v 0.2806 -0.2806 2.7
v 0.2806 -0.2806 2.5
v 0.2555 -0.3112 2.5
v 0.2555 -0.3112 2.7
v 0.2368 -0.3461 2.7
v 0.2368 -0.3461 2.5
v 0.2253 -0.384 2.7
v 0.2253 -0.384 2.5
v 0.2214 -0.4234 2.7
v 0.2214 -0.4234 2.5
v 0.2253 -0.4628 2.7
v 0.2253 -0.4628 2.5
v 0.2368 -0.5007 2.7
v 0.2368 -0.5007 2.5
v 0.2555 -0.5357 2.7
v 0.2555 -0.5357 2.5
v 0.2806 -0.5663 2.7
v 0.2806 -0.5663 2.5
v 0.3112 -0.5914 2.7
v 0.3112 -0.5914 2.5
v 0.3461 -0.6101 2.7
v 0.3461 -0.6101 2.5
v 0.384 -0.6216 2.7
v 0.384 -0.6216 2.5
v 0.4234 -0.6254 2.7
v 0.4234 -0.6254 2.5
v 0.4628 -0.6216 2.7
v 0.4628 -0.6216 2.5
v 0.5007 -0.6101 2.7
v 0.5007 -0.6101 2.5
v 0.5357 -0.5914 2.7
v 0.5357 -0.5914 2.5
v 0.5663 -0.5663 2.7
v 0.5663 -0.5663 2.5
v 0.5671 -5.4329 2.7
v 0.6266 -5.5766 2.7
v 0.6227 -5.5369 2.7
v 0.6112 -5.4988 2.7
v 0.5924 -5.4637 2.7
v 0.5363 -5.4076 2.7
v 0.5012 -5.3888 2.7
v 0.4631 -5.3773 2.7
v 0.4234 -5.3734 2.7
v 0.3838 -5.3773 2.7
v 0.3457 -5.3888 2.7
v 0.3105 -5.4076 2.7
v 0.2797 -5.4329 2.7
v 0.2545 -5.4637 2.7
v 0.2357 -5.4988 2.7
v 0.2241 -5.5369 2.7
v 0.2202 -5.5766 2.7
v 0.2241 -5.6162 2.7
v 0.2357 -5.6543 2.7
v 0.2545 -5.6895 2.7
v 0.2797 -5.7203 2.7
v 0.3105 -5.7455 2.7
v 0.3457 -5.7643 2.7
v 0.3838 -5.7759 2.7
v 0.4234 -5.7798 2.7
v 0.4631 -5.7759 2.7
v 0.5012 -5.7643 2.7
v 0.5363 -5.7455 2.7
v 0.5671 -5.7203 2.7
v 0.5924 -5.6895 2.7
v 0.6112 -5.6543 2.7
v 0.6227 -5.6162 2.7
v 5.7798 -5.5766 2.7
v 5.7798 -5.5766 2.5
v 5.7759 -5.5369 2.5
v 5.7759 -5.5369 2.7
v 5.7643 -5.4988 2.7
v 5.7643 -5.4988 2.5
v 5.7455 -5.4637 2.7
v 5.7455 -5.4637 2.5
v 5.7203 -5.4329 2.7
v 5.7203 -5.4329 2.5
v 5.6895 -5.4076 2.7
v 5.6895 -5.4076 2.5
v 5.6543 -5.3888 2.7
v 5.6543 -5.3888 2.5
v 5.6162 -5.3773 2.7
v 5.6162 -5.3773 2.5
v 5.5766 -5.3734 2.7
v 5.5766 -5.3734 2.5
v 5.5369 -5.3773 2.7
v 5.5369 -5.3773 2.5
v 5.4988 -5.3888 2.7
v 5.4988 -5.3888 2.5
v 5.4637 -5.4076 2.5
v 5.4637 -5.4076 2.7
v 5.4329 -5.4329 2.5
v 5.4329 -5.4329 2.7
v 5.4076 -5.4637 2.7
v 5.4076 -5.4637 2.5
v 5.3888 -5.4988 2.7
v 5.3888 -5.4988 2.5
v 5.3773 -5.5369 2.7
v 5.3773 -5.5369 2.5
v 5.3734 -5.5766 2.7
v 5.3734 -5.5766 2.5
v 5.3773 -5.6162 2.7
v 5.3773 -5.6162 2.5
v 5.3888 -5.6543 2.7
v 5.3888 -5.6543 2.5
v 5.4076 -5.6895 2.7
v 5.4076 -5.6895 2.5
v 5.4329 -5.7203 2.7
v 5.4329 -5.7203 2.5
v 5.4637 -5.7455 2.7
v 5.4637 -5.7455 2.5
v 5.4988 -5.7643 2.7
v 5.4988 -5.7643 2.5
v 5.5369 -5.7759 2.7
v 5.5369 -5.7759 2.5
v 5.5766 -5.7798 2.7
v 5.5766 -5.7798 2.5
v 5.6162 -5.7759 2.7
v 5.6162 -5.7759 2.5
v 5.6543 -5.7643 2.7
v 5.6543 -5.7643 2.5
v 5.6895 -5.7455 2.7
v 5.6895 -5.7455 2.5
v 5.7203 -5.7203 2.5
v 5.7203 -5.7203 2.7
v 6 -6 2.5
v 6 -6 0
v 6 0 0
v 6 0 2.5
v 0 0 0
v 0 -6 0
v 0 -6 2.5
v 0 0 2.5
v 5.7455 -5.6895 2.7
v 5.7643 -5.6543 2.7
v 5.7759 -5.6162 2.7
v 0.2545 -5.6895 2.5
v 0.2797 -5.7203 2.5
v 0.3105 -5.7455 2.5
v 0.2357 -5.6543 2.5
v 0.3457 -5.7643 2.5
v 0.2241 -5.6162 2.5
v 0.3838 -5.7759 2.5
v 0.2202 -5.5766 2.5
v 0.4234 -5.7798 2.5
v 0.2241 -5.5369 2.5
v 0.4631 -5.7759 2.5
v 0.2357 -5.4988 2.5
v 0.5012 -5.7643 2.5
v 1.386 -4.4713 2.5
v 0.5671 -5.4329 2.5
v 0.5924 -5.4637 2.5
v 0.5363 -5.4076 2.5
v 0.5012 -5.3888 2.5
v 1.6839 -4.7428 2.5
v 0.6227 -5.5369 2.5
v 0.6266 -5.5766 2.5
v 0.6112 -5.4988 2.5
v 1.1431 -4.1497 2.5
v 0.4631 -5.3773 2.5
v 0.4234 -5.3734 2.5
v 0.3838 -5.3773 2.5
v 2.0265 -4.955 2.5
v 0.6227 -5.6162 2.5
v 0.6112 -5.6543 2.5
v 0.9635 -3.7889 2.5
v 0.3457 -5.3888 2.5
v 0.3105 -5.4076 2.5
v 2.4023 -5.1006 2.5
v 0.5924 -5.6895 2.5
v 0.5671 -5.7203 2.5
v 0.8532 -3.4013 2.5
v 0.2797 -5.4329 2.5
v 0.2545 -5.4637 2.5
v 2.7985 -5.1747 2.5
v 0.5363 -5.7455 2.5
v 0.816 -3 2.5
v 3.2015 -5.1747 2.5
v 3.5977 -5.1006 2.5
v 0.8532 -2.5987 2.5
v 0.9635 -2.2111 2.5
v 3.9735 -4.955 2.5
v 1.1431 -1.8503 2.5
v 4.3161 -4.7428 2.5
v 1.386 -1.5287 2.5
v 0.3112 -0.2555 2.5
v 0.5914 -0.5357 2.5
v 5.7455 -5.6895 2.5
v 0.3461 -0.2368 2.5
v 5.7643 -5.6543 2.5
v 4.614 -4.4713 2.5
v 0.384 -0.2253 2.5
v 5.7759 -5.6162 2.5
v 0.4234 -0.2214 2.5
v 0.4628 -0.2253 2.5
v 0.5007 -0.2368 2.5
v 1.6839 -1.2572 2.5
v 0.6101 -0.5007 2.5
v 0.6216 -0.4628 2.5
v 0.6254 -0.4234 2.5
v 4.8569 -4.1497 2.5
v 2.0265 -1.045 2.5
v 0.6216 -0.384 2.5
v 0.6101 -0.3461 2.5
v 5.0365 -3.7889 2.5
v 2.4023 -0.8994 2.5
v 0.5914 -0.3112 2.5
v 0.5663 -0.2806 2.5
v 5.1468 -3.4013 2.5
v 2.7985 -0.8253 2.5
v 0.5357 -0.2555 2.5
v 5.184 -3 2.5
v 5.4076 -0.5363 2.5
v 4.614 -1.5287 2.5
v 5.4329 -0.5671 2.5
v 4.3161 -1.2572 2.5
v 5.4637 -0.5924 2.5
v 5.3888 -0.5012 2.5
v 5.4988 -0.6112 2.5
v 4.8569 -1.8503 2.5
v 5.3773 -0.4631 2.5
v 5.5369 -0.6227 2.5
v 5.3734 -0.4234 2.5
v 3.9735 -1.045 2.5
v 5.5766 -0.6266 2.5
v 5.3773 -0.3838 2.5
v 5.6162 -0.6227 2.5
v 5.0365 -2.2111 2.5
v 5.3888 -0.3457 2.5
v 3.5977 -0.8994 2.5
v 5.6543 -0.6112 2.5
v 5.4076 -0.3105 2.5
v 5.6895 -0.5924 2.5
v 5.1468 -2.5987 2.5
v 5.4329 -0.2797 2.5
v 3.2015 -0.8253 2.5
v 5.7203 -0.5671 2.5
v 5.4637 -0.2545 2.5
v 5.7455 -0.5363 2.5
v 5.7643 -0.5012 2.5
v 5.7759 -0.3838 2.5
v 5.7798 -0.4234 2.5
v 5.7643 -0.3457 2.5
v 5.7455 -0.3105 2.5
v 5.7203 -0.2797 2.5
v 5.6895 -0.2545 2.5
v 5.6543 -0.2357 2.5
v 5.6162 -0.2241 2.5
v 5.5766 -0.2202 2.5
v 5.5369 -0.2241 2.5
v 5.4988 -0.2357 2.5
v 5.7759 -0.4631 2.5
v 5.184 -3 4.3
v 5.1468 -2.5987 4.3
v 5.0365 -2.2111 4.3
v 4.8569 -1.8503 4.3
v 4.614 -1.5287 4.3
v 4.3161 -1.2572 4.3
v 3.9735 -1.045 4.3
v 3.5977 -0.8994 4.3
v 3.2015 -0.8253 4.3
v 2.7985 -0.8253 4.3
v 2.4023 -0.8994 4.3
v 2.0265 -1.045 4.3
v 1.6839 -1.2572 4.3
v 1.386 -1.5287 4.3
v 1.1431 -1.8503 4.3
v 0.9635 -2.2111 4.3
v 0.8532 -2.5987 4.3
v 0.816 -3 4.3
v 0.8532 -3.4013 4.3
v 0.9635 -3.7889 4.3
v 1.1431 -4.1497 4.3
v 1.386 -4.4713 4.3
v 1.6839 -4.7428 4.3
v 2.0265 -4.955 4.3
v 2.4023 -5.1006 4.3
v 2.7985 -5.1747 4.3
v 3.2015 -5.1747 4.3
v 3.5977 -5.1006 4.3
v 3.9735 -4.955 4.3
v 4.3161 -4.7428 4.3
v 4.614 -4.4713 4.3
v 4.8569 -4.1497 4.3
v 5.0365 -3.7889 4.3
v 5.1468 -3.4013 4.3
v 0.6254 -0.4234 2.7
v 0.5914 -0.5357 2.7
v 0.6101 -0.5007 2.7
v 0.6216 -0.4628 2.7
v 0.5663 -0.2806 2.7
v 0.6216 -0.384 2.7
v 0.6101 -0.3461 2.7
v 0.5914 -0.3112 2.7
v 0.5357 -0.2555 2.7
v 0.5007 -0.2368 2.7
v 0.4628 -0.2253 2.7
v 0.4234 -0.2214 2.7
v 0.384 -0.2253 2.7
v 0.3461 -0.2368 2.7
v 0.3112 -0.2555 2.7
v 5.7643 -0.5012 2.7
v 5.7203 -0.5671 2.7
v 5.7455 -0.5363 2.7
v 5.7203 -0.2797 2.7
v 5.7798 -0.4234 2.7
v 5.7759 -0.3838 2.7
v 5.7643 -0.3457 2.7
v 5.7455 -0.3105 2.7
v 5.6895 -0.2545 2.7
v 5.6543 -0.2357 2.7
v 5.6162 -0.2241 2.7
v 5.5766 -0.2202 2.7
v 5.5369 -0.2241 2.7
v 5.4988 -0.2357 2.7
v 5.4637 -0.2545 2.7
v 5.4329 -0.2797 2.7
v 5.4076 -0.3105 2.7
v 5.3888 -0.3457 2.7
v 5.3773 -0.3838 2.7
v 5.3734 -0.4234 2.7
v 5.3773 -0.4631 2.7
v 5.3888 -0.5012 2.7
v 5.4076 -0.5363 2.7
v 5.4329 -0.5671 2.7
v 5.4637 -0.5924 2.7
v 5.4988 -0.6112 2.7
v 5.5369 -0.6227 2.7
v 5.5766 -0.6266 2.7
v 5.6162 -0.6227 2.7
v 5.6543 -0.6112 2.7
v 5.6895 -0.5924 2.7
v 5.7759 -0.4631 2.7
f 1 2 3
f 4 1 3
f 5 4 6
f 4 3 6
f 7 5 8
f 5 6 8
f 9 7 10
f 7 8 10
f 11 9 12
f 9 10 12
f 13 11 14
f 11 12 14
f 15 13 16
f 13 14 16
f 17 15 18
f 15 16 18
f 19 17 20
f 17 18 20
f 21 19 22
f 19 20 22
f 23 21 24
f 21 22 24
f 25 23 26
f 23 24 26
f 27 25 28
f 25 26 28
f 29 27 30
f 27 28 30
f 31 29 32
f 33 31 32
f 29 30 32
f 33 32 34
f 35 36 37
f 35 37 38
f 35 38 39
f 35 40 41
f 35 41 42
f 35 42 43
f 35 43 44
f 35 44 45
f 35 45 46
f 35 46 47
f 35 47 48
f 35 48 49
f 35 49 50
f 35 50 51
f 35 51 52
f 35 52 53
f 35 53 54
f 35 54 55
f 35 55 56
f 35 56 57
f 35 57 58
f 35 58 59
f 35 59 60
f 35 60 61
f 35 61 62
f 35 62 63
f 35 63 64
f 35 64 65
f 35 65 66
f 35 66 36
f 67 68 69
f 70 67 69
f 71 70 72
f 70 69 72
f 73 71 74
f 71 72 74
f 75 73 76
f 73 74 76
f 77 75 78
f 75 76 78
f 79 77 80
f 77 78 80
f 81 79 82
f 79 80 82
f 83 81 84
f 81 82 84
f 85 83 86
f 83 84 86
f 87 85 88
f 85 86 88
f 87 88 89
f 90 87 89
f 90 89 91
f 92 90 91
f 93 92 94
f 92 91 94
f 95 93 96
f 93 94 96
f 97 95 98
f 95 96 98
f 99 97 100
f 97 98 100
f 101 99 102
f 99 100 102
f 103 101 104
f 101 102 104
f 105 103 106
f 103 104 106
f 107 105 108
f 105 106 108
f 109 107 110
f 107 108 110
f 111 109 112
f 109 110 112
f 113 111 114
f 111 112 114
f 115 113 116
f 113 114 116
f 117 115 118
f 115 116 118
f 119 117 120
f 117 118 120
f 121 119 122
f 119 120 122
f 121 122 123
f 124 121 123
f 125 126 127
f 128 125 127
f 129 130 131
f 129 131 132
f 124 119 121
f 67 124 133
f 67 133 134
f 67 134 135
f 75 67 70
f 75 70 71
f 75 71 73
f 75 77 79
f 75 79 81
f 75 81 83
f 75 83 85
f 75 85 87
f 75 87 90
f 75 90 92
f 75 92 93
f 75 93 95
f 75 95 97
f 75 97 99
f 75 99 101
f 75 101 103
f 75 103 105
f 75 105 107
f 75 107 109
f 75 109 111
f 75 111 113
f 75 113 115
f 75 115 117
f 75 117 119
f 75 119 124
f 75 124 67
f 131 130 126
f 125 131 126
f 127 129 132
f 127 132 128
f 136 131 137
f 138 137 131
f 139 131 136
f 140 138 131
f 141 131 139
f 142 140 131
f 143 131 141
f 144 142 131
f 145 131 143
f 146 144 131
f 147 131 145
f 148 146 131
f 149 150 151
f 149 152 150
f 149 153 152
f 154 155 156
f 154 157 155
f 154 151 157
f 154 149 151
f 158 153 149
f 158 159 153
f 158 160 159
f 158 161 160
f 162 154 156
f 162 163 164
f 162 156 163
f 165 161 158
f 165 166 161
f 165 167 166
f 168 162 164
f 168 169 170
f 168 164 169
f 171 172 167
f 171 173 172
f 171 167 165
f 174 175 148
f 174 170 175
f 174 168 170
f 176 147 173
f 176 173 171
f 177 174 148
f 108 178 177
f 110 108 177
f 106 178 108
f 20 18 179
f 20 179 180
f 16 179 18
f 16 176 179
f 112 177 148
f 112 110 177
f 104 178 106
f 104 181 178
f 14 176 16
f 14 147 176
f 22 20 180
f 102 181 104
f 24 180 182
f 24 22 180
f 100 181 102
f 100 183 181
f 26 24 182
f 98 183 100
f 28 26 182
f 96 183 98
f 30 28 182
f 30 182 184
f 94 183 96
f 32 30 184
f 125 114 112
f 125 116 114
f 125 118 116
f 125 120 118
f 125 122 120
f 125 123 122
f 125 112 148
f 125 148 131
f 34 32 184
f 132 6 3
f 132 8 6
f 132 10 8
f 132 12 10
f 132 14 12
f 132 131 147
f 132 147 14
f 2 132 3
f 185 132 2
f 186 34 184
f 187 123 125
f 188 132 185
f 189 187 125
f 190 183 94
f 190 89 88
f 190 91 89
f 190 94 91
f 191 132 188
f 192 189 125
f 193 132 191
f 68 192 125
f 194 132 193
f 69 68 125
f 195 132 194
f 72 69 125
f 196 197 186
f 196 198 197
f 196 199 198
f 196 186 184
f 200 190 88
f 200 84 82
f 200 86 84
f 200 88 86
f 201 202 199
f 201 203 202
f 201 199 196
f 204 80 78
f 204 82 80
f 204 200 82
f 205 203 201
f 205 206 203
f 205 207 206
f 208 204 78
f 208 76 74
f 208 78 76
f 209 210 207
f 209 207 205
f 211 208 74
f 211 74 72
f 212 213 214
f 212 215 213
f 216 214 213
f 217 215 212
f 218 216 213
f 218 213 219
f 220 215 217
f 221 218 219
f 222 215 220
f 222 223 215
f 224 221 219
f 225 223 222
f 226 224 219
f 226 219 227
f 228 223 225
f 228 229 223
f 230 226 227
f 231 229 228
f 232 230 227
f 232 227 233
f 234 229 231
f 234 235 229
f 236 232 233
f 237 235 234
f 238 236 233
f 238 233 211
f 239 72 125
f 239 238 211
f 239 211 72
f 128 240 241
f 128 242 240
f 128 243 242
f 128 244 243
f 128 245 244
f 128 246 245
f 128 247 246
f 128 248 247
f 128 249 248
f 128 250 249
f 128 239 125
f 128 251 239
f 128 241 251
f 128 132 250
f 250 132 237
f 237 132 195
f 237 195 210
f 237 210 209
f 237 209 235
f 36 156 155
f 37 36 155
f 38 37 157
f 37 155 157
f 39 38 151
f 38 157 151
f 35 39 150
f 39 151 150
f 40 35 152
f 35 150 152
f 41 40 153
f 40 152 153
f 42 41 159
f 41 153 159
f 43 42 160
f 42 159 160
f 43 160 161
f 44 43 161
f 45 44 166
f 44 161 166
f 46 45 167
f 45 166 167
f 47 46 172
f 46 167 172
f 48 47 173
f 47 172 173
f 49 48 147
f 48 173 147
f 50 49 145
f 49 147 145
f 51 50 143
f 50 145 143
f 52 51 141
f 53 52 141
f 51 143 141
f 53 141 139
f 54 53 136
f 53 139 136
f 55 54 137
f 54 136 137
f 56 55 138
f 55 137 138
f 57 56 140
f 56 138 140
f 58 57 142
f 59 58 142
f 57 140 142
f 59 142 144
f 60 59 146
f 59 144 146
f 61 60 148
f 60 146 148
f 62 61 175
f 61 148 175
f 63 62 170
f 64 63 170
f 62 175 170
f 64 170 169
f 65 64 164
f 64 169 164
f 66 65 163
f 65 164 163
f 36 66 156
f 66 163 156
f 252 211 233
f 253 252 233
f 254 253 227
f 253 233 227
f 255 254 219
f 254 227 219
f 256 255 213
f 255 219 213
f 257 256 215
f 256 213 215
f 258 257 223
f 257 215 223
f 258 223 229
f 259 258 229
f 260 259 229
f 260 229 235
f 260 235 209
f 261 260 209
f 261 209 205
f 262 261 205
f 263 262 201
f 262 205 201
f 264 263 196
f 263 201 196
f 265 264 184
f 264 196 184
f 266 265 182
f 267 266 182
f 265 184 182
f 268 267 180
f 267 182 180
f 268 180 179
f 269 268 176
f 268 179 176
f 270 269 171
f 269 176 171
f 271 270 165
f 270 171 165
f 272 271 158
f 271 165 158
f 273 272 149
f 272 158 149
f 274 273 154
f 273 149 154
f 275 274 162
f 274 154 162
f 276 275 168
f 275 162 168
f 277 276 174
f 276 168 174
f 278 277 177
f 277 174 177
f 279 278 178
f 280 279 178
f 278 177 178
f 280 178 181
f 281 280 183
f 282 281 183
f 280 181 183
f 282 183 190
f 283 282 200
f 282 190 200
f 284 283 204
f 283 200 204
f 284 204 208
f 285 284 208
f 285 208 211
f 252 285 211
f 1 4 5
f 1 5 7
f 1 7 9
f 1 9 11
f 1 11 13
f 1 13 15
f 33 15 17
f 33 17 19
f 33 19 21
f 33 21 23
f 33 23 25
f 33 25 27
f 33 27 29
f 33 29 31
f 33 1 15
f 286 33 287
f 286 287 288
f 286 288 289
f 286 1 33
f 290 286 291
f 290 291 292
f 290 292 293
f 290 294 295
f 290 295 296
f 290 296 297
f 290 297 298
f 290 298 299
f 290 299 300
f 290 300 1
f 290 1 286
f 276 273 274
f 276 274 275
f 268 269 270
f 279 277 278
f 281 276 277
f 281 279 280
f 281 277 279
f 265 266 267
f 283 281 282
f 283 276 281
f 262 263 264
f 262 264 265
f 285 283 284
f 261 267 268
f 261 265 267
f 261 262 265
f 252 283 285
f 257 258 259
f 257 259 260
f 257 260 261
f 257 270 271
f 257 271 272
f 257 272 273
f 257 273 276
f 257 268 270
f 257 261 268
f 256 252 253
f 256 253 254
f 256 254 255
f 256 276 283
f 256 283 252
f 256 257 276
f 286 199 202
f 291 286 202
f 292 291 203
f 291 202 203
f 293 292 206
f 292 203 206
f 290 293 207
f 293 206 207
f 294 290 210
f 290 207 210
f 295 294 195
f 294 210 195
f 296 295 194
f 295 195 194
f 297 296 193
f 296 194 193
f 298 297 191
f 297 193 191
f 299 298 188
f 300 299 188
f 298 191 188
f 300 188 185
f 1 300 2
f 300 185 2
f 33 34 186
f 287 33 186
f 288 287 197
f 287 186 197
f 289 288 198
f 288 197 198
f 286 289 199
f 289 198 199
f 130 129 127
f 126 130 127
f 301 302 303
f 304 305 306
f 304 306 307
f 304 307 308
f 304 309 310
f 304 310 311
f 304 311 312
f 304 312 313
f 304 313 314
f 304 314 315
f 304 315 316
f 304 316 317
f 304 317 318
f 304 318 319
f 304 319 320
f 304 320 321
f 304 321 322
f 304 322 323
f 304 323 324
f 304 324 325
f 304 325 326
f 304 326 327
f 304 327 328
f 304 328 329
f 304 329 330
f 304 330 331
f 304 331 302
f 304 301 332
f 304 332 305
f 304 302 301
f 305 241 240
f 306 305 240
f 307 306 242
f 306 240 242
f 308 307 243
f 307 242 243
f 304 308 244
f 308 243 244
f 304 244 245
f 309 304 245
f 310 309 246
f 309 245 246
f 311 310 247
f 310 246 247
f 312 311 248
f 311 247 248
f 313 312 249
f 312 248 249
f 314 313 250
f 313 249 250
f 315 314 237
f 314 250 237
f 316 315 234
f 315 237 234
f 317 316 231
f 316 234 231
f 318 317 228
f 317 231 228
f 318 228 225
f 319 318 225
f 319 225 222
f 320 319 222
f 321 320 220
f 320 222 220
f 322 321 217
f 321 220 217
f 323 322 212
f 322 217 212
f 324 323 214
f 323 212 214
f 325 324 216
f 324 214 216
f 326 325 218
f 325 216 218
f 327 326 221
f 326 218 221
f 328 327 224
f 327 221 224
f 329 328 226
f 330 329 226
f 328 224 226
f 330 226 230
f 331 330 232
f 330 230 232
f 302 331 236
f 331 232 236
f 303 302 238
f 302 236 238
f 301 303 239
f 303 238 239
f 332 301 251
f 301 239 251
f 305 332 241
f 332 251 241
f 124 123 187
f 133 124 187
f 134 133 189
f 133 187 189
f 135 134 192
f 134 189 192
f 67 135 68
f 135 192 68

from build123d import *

# Parameters (mm, degrees)
F0_W     = 6
F0_H     = 6
F1_DEPTH = 2.5
F2_R     = 2.18397174
F3_DEPTH = 1.8
F2_R_2   = 0.2032
F4_DEPTH = 0.2


with BuildPart() as f1:
    # F0 (on Top) → F1 (new body)
    with BuildSketch(Plane.XY):
        with Locations((3, -3)):
            Rectangle(F0_W, F0_H)
    extrude(amount=F1_DEPTH)

    # F2 (on face) → F3 (join)
    with BuildSketch(Plane.XY.offset(2.5)):
        with Locations((3, -3)):
            Circle(F2_R)
    extrude(amount=F3_DEPTH)

    # F2 (on face) → F4 (join)
    with BuildSketch(Plane.XY.offset(2.5)):
        with BuildLine():
            ThreePointArc((0.6254458211, -0.4234319816), (0.5007393311, -0.23679553), (0.2805866258, -0.2805866258))
            ThreePointArc((0.2805866258, -0.2805866258), (0.2805866258, -0.5662773374), (0.5662773374, -0.5662773374))
            ThreePointArc((0.5662773374, -0.5662773374), (0.6100684332, -0.5007393311), (0.6254458211, -0.4234319816))
        make_face()
        with BuildLine():
            ThreePointArc((5.7797680184, -5.5765680184), (5.3888356974, -5.498806745), (5.7202521163, -5.7202521163))
            ThreePointArc((5.7202521163, -5.7202521163), (5.7643003394, -5.6543292919), (5.7797680184, -5.5765680184))
        make_face()
        with BuildLine():
            ThreePointArc((5.7797680184, -0.4234319816), (5.7643003394, -0.3456707081), (5.7202521163, -0.2797478837))
            ThreePointArc((5.7202521163, -0.2797478837), (5.3888356974, -0.501193255), (5.7797680184, -0.4234319816))
        make_face()
        with Locations((0.4234319816, -5.5765680184)):
            Circle(F2_R_2)
    extrude(amount=F4_DEPTH)


solid = f1.part
